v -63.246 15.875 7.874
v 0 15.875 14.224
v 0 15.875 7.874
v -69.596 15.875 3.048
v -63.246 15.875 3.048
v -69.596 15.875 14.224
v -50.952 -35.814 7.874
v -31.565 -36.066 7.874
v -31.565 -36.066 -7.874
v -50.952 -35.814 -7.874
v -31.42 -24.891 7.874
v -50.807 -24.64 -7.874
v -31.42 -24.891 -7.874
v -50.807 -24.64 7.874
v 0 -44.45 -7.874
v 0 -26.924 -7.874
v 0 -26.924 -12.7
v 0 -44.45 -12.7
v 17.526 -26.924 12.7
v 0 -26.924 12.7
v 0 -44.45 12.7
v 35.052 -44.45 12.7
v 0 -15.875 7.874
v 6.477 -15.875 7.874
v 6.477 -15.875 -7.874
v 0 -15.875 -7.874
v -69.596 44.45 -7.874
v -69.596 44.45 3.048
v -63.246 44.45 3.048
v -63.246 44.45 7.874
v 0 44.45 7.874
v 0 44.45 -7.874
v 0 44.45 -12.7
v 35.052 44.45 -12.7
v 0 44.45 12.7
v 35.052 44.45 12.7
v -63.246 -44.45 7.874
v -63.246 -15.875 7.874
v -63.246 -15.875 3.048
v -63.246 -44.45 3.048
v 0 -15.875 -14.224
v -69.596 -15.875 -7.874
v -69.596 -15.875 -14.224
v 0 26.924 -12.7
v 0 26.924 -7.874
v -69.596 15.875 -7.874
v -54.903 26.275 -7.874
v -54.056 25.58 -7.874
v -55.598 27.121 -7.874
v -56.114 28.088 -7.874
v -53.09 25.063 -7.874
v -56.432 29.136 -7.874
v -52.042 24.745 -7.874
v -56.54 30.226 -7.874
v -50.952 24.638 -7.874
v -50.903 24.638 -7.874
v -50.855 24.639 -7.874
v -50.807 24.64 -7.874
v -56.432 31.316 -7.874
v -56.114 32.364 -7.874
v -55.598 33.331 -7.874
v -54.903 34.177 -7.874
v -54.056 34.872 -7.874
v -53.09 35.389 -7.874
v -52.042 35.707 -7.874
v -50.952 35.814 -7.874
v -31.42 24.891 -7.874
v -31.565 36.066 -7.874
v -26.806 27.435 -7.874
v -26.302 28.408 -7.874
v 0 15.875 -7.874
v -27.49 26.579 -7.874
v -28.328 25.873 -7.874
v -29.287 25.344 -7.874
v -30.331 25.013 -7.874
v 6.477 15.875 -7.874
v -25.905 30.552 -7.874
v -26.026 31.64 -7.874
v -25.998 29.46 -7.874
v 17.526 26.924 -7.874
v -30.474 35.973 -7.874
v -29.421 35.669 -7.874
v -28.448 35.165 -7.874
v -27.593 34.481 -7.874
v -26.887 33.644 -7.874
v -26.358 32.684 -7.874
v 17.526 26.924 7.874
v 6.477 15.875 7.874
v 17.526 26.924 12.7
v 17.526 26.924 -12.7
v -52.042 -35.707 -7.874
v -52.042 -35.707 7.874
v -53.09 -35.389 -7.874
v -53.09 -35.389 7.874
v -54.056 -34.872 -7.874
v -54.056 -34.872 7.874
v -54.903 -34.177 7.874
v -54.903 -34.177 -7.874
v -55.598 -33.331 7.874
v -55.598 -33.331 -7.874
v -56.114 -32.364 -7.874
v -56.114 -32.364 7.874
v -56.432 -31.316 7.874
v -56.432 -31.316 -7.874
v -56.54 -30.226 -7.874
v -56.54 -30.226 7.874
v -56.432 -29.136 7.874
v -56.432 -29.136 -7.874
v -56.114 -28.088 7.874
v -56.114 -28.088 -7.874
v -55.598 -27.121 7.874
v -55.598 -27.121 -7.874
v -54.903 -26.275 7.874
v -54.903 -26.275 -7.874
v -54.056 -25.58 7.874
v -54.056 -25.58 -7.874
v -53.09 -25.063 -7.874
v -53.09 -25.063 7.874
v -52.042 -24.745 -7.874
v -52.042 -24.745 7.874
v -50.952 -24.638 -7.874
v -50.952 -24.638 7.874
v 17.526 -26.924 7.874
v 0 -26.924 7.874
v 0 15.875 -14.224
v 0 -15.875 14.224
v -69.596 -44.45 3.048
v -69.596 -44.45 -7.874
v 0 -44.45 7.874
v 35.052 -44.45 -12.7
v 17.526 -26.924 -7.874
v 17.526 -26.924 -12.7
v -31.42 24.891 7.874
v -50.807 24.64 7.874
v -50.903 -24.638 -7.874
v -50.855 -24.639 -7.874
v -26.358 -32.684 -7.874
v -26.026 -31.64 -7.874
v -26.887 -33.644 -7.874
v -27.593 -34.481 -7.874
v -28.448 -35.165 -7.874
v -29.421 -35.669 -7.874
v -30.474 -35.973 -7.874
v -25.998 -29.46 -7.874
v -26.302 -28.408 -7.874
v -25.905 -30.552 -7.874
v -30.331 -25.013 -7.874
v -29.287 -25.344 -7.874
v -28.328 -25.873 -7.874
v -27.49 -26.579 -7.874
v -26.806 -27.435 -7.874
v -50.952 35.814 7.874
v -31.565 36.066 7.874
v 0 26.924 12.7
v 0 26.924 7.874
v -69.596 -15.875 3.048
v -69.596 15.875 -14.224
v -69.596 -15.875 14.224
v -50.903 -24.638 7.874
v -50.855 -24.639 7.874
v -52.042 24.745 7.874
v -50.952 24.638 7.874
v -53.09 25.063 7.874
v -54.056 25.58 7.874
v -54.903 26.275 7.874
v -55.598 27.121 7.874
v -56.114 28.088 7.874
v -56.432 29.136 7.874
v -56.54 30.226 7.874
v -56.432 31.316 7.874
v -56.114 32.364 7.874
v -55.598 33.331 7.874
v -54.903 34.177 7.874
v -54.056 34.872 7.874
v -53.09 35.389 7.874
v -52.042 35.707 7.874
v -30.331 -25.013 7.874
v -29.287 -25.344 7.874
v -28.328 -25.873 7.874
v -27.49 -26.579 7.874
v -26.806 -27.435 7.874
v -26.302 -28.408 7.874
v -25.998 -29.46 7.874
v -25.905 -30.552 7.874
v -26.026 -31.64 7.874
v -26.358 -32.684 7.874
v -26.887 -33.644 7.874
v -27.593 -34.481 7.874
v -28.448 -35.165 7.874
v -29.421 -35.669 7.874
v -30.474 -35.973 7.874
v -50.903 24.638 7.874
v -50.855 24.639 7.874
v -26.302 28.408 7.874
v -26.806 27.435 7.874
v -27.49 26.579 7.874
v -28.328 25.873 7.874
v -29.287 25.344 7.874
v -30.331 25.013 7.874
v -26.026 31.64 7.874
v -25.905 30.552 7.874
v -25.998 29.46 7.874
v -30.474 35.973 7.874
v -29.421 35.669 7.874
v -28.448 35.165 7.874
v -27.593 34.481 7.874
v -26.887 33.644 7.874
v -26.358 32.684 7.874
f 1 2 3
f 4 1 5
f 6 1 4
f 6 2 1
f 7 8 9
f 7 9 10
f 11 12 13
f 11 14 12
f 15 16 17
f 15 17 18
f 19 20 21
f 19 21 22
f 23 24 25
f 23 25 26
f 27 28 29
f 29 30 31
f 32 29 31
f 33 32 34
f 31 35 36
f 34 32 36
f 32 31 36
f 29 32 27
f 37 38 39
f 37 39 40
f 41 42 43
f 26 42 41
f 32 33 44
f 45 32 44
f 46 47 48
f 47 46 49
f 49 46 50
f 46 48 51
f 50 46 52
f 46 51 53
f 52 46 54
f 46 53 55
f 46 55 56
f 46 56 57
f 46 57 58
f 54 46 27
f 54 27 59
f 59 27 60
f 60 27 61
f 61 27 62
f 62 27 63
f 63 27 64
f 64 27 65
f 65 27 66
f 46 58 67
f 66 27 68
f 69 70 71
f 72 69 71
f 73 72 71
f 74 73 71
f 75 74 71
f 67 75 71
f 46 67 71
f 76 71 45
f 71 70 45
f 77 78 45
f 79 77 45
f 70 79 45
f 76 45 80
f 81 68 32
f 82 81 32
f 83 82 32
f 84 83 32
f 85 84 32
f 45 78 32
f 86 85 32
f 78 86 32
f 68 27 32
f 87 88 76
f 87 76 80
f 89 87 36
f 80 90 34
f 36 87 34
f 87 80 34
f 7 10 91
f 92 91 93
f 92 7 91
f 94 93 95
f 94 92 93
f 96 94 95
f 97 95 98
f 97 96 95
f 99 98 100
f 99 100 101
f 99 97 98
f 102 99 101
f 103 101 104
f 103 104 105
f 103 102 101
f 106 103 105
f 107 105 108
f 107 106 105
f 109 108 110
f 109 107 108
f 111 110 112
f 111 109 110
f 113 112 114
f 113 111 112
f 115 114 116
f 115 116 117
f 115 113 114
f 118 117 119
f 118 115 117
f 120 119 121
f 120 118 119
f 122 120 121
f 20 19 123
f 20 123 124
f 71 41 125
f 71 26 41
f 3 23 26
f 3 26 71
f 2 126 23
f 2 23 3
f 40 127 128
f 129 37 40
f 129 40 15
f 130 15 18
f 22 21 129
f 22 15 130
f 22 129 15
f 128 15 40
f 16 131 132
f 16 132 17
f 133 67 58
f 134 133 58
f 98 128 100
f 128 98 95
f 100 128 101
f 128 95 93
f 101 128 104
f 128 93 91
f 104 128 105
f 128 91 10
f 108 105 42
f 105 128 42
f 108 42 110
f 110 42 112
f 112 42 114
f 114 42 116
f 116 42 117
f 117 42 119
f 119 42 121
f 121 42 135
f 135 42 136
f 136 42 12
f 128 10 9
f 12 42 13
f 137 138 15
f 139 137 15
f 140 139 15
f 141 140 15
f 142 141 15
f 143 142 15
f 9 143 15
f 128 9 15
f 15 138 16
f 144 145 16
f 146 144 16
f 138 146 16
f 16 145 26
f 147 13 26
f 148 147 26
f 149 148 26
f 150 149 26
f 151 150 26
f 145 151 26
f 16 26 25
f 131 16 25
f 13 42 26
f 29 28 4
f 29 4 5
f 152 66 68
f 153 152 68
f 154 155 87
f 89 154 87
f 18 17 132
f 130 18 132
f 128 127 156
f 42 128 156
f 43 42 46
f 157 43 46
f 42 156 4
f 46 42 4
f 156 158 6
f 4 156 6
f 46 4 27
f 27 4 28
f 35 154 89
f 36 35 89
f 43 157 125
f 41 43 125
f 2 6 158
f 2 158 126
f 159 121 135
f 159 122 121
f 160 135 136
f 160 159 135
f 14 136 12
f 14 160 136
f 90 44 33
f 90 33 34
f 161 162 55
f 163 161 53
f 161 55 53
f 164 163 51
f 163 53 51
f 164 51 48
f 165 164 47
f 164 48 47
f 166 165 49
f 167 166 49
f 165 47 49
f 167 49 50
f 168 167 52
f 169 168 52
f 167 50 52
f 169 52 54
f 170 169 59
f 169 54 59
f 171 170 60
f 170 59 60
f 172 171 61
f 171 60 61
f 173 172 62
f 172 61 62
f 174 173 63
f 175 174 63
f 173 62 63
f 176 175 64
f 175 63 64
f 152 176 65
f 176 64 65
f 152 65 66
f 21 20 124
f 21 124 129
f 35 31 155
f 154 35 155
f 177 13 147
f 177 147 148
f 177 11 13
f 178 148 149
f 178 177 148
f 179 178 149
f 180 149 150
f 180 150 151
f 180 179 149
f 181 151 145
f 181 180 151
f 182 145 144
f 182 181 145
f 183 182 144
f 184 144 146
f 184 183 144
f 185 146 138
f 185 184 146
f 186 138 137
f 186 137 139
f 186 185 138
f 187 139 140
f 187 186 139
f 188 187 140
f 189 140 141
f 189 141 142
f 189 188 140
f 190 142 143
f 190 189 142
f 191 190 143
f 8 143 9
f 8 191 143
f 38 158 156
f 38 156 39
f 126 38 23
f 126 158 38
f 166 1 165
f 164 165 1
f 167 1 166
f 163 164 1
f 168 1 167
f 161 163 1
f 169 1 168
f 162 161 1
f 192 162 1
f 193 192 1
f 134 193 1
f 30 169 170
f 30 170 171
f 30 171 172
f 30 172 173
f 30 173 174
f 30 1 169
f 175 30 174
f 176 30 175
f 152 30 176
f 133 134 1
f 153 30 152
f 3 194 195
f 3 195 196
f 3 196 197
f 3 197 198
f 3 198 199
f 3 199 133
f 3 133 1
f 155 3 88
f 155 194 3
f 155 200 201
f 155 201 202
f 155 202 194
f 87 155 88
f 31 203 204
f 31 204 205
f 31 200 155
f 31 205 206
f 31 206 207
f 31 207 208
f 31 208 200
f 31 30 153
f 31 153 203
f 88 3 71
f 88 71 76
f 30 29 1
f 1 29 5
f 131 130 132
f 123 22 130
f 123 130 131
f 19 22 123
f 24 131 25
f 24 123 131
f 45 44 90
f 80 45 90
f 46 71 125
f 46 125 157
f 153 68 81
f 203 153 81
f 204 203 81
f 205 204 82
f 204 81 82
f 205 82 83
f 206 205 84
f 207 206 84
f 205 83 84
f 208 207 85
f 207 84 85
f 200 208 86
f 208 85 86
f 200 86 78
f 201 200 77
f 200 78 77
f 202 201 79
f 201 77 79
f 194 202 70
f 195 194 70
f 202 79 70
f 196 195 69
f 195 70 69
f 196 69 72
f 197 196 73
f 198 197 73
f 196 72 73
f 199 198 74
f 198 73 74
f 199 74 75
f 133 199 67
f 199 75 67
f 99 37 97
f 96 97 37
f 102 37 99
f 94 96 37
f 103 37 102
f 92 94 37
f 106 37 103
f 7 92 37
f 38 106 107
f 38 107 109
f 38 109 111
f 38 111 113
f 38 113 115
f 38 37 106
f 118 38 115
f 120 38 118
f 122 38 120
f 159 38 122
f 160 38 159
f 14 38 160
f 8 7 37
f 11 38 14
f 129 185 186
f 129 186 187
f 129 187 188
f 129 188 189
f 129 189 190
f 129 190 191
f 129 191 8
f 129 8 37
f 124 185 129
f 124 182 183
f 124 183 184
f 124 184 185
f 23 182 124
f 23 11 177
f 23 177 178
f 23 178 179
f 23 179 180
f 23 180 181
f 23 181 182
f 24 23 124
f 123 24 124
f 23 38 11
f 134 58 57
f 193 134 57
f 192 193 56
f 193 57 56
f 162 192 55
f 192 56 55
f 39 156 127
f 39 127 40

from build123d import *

# Parameters (mm, degrees)
F1_DEPTH      = 14.224
F2_DEPTH      = 7.874
F3_DEPTH      = 12.7
F0_W          = 6.35
F0_H          = 28.575
F4_DEPTH      = 3.048
F4_DEPTH_BACK = 7.874


with BuildPart() as f1:
    # F0 (on Top) → F1 (new body, symmetric)
    with BuildSketch(Plane.XY):
        Polygon((0, 0), (0, 15.875), (-31.492241, 15.875), (-50.951816, 15.875), (-63.246, 15.875), (-69.596, 15.875), (-69.596, 0), (-69.596, -15.875), (-63.246, -15.875), (-50.951816, -15.875), (-31.492241, -15.875), (0, -15.875), align=None)
    extrude(amount=F1_DEPTH, both=True)

    # F0 (on Top) → F2 (join, symmetric)
    with BuildSketch(Plane.XY):
        Polygon((-31.492241, 15.875), (0, 15.875), (6.477, 15.875), (17.526, 26.924), (0, 26.924), (0, 44.45), (-63.246, 44.45), (-63.246, 15.875), (-50.951816, 15.875), align=None)
        with BuildLine():
            ThreePointArc((-50.951816, 24.638), (-56.539816, 30.226), (-50.951816, 35.814))
            Line((-50.951816, 35.814), (-31.565, 36.066451))
            ThreePointArc((-31.565, 36.066451), (-25.904713, 30.551549), (-31.419752, 24.891395))
            Line((-31.419752, 24.891395), (-50.806851, 24.639881))
            ThreePointArc((-50.806851, 24.639881), (-50.879328, 24.63847), (-50.951816, 24.638))
        make_face(mode=Mode.SUBTRACT)
        Polygon((6.477, -15.875), (0, -15.875), (-31.492241, -15.875), (-50.951816, -15.875), (-63.246, -15.875), (-63.246, -44.45), (0, -44.45), (0, -26.924), (17.526, -26.924), align=None)
        with BuildLine():
            Line((-31.565, -36.066451), (-50.951816, -35.814))
            ThreePointArc((-50.951816, -35.814), (-56.539816, -30.226), (-50.951816, -24.638))
            ThreePointArc((-50.951816, -24.638), (-50.879328, -24.63847), (-50.806851, -24.639881))
            Line((-50.806851, -24.639881), (-31.419752, -24.891395))
            ThreePointArc((-31.419752, -24.891395), (-25.904713, -30.551549), (-31.565, -36.066451))
        make_face(mode=Mode.SUBTRACT)
    extrude(amount=F2_DEPTH, both=True)

    # F0 (on Top) → F3 (join, symmetric)
    with BuildSketch(Plane.XY):
        Polygon((0, 26.924), (17.526, 26.924), (35.052, 44.45), (0, 44.45), align=None)
        Polygon((35.052, -44.45), (17.526, -26.924), (0, -26.924), (0, -44.45), align=None)
    extrude(amount=F3_DEPTH, both=True)

    # F0 (on Top) → F4 (join, two sides)
    with BuildSketch(Plane.XY) as f4_sk:
        with Locations((-66.421, 30.1625)):
            Rectangle(F0_W, F0_H)
        with Locations((-66.421, -30.1625)):
            Rectangle(F0_W, F0_H)
    extrude(amount=F4_DEPTH)
    extrude(f4_sk.sketch, amount=-F4_DEPTH_BACK)


solid = f1.part
